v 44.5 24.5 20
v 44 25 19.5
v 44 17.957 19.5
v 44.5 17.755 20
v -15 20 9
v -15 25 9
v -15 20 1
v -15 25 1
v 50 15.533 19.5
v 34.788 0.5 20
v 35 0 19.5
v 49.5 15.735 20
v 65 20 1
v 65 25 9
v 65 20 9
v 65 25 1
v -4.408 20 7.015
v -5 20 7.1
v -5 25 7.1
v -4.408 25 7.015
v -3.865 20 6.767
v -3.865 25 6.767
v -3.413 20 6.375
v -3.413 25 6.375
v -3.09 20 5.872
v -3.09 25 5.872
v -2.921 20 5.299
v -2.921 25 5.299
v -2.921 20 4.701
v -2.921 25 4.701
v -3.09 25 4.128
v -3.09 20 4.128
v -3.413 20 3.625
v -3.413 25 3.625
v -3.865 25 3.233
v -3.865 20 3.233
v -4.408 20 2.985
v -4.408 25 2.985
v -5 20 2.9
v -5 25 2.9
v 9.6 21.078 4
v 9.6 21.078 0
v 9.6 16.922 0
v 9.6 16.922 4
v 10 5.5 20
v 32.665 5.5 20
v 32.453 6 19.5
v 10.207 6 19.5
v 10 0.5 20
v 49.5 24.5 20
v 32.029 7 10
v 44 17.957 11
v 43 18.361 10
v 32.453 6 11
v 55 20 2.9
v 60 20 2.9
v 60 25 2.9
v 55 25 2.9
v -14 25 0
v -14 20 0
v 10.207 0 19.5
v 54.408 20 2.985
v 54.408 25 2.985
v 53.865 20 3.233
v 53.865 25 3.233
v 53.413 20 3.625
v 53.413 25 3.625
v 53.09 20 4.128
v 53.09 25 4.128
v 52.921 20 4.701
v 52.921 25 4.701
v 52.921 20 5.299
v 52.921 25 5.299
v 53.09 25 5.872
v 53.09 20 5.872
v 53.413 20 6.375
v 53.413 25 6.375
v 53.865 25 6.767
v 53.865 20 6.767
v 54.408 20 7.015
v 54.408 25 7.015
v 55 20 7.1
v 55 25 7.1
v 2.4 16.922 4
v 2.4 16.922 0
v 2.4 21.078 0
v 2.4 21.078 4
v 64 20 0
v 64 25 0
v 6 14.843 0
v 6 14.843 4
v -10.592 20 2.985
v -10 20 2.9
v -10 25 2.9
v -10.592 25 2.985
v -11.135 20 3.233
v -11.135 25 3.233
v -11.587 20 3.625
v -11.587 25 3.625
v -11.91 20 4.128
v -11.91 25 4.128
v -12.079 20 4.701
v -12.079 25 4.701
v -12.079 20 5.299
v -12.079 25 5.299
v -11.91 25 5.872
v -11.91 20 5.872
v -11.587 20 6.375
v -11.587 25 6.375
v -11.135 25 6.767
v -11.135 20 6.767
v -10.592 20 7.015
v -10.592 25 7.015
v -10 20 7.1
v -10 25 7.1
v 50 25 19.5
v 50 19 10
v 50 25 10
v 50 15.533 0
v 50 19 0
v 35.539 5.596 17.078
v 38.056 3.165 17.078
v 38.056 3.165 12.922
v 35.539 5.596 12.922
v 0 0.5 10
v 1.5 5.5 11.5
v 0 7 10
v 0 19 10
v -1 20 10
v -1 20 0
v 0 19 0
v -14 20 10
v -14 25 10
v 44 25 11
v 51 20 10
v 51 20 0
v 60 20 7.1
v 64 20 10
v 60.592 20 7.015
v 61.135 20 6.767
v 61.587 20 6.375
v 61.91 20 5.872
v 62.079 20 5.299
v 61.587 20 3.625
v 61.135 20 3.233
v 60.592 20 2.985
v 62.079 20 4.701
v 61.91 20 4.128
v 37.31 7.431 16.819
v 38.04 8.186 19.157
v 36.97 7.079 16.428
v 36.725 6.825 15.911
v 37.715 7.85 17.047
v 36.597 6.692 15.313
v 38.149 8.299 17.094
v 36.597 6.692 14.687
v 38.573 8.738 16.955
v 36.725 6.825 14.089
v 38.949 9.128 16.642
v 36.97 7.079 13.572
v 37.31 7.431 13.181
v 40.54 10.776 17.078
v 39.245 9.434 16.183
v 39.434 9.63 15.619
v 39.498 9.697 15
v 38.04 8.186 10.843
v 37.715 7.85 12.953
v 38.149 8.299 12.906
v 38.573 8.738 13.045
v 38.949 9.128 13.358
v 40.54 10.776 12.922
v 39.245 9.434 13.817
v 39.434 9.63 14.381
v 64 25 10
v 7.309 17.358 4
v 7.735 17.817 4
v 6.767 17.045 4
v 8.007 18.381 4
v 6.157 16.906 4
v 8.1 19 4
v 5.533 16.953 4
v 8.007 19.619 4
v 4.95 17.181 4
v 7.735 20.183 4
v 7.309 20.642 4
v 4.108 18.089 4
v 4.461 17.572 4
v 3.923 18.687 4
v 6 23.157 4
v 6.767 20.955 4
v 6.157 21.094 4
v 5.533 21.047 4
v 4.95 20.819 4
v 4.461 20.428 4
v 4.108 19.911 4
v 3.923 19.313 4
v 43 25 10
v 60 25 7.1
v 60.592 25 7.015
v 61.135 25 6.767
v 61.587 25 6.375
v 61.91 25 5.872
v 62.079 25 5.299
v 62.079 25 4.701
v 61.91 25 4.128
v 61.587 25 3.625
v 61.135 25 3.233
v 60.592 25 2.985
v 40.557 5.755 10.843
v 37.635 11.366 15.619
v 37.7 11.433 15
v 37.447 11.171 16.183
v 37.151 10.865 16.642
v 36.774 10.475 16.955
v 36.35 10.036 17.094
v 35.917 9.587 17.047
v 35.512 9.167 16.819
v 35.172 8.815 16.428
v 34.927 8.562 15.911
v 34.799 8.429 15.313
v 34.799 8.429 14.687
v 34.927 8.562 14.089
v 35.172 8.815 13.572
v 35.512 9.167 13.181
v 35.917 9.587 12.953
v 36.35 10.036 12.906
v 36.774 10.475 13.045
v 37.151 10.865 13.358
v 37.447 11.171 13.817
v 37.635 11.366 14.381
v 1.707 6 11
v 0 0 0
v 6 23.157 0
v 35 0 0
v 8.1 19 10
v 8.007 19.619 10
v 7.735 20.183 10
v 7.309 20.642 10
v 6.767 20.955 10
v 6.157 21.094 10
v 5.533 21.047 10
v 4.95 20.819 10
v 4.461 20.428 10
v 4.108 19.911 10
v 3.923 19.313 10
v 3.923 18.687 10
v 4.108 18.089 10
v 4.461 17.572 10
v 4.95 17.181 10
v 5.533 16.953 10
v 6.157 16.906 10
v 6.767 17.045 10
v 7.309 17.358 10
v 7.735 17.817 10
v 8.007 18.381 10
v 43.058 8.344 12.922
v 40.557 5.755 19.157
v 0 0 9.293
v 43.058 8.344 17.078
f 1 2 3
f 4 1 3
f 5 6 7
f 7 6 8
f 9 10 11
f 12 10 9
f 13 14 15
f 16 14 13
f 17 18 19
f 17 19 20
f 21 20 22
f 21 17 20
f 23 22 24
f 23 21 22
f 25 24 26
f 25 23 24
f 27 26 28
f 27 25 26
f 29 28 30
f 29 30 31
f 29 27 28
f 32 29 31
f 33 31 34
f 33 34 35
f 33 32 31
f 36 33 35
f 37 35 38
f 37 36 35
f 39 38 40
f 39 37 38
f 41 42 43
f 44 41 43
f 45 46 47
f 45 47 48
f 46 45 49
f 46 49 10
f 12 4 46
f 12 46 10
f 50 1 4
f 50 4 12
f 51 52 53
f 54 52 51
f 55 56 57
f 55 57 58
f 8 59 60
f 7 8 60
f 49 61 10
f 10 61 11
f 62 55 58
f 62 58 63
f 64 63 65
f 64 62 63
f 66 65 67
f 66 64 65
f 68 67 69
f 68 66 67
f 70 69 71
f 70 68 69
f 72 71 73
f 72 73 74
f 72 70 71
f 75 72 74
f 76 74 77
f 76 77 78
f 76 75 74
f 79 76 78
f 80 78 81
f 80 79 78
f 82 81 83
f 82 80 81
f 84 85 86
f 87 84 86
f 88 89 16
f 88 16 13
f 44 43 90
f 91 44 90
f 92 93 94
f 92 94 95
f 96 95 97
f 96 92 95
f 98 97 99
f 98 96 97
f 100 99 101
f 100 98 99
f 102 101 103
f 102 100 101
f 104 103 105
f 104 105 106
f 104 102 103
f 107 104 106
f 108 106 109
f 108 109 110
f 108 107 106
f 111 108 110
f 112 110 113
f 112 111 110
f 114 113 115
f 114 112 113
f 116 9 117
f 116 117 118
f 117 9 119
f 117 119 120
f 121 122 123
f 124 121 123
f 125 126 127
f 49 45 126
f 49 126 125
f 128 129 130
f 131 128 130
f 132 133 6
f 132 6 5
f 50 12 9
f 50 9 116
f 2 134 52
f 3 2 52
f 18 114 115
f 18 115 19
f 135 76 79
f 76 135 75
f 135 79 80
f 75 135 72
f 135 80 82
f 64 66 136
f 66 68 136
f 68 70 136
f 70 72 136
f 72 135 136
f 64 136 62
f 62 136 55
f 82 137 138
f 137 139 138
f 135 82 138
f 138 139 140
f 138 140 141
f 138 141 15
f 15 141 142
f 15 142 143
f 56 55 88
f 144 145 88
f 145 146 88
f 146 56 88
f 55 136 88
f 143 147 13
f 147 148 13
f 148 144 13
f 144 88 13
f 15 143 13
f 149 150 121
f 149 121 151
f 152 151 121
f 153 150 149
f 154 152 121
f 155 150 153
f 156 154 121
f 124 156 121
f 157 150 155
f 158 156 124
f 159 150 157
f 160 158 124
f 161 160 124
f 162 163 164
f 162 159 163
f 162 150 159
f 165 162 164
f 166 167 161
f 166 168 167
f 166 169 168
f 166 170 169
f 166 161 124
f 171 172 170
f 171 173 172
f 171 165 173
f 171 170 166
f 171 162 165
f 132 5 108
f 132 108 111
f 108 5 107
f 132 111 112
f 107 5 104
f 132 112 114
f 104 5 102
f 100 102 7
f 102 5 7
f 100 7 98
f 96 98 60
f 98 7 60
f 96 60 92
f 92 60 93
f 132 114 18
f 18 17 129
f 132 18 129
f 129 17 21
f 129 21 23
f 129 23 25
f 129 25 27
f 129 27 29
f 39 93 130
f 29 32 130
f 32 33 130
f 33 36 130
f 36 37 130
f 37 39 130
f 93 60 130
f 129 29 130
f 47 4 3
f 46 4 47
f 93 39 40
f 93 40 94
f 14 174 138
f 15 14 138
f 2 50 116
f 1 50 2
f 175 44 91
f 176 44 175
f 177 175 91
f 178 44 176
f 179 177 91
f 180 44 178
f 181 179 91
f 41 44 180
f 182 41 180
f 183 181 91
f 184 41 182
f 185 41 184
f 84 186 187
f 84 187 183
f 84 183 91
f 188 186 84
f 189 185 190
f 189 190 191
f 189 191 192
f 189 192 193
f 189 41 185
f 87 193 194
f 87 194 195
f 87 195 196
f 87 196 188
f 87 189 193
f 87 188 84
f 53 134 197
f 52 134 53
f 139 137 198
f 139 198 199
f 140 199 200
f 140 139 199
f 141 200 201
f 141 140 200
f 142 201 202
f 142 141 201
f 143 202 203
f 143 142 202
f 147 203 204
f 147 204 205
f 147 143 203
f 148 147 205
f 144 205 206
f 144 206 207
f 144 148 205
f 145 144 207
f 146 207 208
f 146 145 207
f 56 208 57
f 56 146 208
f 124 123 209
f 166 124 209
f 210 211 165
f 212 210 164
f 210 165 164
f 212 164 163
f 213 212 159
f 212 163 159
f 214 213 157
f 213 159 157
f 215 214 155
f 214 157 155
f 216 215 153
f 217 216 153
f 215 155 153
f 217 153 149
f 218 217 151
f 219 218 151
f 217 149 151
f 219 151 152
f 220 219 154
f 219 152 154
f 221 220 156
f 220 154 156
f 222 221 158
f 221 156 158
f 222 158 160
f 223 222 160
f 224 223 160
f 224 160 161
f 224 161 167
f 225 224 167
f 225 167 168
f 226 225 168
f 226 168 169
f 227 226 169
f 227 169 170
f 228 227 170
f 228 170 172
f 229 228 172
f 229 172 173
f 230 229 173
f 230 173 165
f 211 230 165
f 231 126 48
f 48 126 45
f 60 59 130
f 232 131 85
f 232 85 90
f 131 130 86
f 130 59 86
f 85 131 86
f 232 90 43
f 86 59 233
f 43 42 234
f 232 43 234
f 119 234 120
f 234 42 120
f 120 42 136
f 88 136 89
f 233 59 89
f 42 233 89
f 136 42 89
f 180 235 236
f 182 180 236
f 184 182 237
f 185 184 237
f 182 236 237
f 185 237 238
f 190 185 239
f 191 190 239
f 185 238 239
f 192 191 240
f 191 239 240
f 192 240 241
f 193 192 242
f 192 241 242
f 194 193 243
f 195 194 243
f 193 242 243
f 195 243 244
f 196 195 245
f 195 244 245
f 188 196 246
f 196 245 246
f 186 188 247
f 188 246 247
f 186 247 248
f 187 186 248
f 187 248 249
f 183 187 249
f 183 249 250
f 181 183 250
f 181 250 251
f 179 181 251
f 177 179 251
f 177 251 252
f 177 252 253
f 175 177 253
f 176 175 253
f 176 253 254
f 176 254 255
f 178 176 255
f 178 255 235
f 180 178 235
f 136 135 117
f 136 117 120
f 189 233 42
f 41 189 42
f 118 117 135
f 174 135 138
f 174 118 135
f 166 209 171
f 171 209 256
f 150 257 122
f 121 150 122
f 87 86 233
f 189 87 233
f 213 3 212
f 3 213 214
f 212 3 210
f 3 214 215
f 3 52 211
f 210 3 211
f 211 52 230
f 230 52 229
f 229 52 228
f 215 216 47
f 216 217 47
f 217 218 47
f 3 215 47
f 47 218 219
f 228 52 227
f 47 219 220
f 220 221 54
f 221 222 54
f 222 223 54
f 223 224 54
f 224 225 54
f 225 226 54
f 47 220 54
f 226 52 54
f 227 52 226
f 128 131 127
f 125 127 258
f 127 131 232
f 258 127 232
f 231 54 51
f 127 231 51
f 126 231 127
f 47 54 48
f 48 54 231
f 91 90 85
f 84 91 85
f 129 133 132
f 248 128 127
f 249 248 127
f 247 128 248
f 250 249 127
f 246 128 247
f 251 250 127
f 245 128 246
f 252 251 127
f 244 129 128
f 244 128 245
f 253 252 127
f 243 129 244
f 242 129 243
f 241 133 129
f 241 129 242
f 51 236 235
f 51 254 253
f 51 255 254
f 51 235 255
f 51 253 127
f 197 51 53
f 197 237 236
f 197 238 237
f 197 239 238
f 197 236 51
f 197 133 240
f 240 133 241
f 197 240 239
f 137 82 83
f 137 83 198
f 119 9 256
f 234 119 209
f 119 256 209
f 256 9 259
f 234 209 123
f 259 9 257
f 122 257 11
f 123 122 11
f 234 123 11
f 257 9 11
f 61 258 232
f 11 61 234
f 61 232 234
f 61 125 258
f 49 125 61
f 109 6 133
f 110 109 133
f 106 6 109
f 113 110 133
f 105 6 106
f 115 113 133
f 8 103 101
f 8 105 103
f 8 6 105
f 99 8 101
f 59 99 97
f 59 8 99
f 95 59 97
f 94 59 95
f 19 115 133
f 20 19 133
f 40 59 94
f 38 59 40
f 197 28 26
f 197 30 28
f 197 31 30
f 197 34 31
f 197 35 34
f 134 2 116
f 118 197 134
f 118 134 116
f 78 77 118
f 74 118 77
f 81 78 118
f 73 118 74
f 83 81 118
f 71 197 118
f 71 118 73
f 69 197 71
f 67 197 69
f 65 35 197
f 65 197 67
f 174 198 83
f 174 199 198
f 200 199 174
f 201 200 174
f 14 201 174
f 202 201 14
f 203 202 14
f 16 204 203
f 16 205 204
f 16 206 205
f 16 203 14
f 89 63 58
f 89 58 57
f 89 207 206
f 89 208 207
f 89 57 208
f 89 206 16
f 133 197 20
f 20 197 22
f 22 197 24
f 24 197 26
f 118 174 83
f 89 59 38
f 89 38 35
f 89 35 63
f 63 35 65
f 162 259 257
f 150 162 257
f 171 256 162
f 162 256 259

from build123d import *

# Parameters (mm, degrees)
SKICA1_W                 = 50
SKICA1_H                 = 25
P_IDAT_VYSUNUT_M1_DEPTH  = 10
P_IDAT_VYSUNUT_M2_DEPTH  = 10
SKICA3_R                 = 2.1
ODEBRAT_VYSUNUT_M1_DEPTH = 10
ODEBRAT_VYSUNUT_M2_DEPTH = 10
SKICA5_R                 = 2.1
ODEBRAT_VYSUNUT_M3_DEPTH = 10
SKICA6_W                 = 15
SKICA6_H                 = 10
P_IDAT_VYSUNUT_M3_DEPTH  = 5
ODEBRAT_VYSUNUT_M5_DEPTH = 3.5
ODEBRAT_VYSUNUT_M6_DEPTH = 4
ZKOSEN_1_SIZE            = 10
ODEBRAT_VYSUNUT_M7_DEPTH = 5
ZKOSEN_3_SIZE            = 1
ZKOSEN_4_SIZE            = 0.5
ZKOSEN_5_SIZE            = 1
ZKOSEN_7_SIZE            = 1


with BuildPart() as part:
    # Skica1 → Přidat vysunutím1 (new body)
    with BuildSketch(Plane.XY):
        with Locations((25, 12.5)):
            Rectangle(SKICA1_W, SKICA1_H)
    extrude(amount=P_IDAT_VYSUNUT_M1_DEPTH)

    # Skica2 → Přidat vysunutím2 (add)
    with BuildSketch(Plane.XY.offset(10)):
        Polygon((0, 0), (35, 0), (50, 15.532954707), (50, 25), (44, 25), (44, 17.957112062), (32.453151103, 6), (0, 6), align=None)
    extrude(amount=P_IDAT_VYSUNUT_M2_DEPTH)

    # Skica3 → Odebrat vysunutím1 (cut)
    with BuildSketch(Plane.XY.offset(10)):
        with Locations((6, 19)):
            Circle(SKICA3_R)
    extrude(amount=-ODEBRAT_VYSUNUT_M1_DEPTH, mode=Mode.SUBTRACT)

    # Skica4 → Odebrat vysunutím2 (cut)
    with BuildSketch(Plane.XY.offset(10)):
        Polygon((50, 15.532954707), (35, 0), (50, 0), align=None)
    extrude(amount=-ODEBRAT_VYSUNUT_M2_DEPTH, mode=Mode.SUBTRACT)

    # Skica5 → Odebrat vysunutím3 (cut)
    with BuildSketch(Plane(origin=(18.110741192, -17.489339473, 0), x_dir=(0, 0, -1), z_dir=(0.7193398003386524, -0.6946583704589961, 0))):
        with Locations(Location((-15, 32.313042966, 0), (0, 0, 90))):
            Circle(SKICA5_R)
    extrude(amount=-ODEBRAT_VYSUNUT_M3_DEPTH, mode=Mode.SUBTRACT)

    # Skica6 → Přidat vysunutím3 (add)
    with BuildSketch(Plane(origin=(0, 25, 0), x_dir=(1, 0, 0), z_dir=(0, 1, 0))):
        with Locations((-7.5, -5)):
            Rectangle(SKICA6_W, SKICA6_H)
        with Locations((57.5, -5)):
            Rectangle(SKICA6_W, SKICA6_H)
    extrude(amount=-P_IDAT_VYSUNUT_M3_DEPTH)

    # Skica9 → Odebrat vysunutím5 (cut)
    with BuildSketch(Plane(origin=(18.110741192, -17.489339473, 0), x_dir=(0, 0, -1), z_dir=(0.7193398003386524, -0.6946583704589961, 0))):
        Polygon((-19.156921938, 32.313042966), (-17.078460969, 28.713042966), (-12.921539031, 28.713042966), (-10.843078062, 32.313042966), (-12.921539031, 35.913042966), (-17.078460969, 35.913042966), align=None)
    extrude(amount=-ODEBRAT_VYSUNUT_M5_DEPTH, mode=Mode.SUBTRACT)

    # Skica10 → Odebrat vysunutím6 (cut)
    with BuildSketch(Plane(origin=(0, 0, 0), x_dir=(-1, 0, 0), z_dir=(0, 0, -1))):
        Polygon((-6, 23.156921938), (-9.6, 21.078460969), (-9.6, 16.921539031), (-6, 14.843078062), (-2.4, 16.921539031), (-2.4, 21.078460969), align=None)
    extrude(amount=-ODEBRAT_VYSUNUT_M6_DEPTH, mode=Mode.SUBTRACT)

    # Zkosení1
    zkosen_1_edges = [part.edges().sort_by_distance(p)[0] for p in [
        (0, 3, 20),
    ]]
    chamfer(zkosen_1_edges, length=ZKOSEN_1_SIZE)

    # Skica11 → Odebrat vysunutím7 (cut)
    with BuildSketch(Plane.XZ.offset(-20)):
        with BuildLine():
            Line((-10, 7.1), (-5, 7.1))
            ThreePointArc((-5, 7.1), (-2.9, 5), (-5, 2.9))
            Line((-5, 2.9), (-10, 2.9))
            ThreePointArc((-10, 2.9), (-12.1, 5), (-10, 7.1))
        make_face()
        with BuildLine():
            Line((55, 7.1), (60, 7.1))
            ThreePointArc((60, 7.1), (62.1, 5), (60, 2.9))
            Line((60, 2.9), (55, 2.9))
            ThreePointArc((55, 2.9), (52.9, 5), (55, 7.1))
        make_face()
    extrude(amount=-ODEBRAT_VYSUNUT_M7_DEPTH, mode=Mode.SUBTRACT)

    # Zkosení3
    zkosen_3_edges = [part.edges().sort_by_distance(p)[0] for p in [
        (44, 21.478556031, 10),
        (38.226575551, 11.978556031, 10),
        (16.226575551, 6, 10),
    ]]
    chamfer(zkosen_3_edges, length=ZKOSEN_3_SIZE)

    # Zkosení4
    zkosen_4_edges = [part.edges().sort_by_distance(p)[0] for p in [
        (22.5, 0, 20),
        (5, 0, 15),
        (5.5, 6, 15.5),
        (42.5, 7.766477353, 20),
        (50, 20.266477353, 20),
        (47, 25, 20),
        (44, 21.478556031, 20),
        (38.226575551, 11.978556031, 20),
        (21.226575551, 6, 20),
    ]]
    chamfer(zkosen_4_edges, length=ZKOSEN_4_SIZE)

    # Zkosení5
    zkosen_5_edges = [part.edges().sort_by_distance(p)[0] for p in [
        (0, 20, 5),
        (50, 20, 5),
    ]]
    chamfer(zkosen_5_edges, length=ZKOSEN_5_SIZE)

    # Zkosení7
    zkosen_7_edges = [part.edges().sort_by_distance(p)[0] for p in [
        (-15, 22.5, 10),
        (-15, 22.5, 0),
        (65, 22.5, 0),
        (65, 22.5, 10),
    ]]
    chamfer(zkosen_7_edges, length=ZKOSEN_7_SIZE)


solid = part.part
